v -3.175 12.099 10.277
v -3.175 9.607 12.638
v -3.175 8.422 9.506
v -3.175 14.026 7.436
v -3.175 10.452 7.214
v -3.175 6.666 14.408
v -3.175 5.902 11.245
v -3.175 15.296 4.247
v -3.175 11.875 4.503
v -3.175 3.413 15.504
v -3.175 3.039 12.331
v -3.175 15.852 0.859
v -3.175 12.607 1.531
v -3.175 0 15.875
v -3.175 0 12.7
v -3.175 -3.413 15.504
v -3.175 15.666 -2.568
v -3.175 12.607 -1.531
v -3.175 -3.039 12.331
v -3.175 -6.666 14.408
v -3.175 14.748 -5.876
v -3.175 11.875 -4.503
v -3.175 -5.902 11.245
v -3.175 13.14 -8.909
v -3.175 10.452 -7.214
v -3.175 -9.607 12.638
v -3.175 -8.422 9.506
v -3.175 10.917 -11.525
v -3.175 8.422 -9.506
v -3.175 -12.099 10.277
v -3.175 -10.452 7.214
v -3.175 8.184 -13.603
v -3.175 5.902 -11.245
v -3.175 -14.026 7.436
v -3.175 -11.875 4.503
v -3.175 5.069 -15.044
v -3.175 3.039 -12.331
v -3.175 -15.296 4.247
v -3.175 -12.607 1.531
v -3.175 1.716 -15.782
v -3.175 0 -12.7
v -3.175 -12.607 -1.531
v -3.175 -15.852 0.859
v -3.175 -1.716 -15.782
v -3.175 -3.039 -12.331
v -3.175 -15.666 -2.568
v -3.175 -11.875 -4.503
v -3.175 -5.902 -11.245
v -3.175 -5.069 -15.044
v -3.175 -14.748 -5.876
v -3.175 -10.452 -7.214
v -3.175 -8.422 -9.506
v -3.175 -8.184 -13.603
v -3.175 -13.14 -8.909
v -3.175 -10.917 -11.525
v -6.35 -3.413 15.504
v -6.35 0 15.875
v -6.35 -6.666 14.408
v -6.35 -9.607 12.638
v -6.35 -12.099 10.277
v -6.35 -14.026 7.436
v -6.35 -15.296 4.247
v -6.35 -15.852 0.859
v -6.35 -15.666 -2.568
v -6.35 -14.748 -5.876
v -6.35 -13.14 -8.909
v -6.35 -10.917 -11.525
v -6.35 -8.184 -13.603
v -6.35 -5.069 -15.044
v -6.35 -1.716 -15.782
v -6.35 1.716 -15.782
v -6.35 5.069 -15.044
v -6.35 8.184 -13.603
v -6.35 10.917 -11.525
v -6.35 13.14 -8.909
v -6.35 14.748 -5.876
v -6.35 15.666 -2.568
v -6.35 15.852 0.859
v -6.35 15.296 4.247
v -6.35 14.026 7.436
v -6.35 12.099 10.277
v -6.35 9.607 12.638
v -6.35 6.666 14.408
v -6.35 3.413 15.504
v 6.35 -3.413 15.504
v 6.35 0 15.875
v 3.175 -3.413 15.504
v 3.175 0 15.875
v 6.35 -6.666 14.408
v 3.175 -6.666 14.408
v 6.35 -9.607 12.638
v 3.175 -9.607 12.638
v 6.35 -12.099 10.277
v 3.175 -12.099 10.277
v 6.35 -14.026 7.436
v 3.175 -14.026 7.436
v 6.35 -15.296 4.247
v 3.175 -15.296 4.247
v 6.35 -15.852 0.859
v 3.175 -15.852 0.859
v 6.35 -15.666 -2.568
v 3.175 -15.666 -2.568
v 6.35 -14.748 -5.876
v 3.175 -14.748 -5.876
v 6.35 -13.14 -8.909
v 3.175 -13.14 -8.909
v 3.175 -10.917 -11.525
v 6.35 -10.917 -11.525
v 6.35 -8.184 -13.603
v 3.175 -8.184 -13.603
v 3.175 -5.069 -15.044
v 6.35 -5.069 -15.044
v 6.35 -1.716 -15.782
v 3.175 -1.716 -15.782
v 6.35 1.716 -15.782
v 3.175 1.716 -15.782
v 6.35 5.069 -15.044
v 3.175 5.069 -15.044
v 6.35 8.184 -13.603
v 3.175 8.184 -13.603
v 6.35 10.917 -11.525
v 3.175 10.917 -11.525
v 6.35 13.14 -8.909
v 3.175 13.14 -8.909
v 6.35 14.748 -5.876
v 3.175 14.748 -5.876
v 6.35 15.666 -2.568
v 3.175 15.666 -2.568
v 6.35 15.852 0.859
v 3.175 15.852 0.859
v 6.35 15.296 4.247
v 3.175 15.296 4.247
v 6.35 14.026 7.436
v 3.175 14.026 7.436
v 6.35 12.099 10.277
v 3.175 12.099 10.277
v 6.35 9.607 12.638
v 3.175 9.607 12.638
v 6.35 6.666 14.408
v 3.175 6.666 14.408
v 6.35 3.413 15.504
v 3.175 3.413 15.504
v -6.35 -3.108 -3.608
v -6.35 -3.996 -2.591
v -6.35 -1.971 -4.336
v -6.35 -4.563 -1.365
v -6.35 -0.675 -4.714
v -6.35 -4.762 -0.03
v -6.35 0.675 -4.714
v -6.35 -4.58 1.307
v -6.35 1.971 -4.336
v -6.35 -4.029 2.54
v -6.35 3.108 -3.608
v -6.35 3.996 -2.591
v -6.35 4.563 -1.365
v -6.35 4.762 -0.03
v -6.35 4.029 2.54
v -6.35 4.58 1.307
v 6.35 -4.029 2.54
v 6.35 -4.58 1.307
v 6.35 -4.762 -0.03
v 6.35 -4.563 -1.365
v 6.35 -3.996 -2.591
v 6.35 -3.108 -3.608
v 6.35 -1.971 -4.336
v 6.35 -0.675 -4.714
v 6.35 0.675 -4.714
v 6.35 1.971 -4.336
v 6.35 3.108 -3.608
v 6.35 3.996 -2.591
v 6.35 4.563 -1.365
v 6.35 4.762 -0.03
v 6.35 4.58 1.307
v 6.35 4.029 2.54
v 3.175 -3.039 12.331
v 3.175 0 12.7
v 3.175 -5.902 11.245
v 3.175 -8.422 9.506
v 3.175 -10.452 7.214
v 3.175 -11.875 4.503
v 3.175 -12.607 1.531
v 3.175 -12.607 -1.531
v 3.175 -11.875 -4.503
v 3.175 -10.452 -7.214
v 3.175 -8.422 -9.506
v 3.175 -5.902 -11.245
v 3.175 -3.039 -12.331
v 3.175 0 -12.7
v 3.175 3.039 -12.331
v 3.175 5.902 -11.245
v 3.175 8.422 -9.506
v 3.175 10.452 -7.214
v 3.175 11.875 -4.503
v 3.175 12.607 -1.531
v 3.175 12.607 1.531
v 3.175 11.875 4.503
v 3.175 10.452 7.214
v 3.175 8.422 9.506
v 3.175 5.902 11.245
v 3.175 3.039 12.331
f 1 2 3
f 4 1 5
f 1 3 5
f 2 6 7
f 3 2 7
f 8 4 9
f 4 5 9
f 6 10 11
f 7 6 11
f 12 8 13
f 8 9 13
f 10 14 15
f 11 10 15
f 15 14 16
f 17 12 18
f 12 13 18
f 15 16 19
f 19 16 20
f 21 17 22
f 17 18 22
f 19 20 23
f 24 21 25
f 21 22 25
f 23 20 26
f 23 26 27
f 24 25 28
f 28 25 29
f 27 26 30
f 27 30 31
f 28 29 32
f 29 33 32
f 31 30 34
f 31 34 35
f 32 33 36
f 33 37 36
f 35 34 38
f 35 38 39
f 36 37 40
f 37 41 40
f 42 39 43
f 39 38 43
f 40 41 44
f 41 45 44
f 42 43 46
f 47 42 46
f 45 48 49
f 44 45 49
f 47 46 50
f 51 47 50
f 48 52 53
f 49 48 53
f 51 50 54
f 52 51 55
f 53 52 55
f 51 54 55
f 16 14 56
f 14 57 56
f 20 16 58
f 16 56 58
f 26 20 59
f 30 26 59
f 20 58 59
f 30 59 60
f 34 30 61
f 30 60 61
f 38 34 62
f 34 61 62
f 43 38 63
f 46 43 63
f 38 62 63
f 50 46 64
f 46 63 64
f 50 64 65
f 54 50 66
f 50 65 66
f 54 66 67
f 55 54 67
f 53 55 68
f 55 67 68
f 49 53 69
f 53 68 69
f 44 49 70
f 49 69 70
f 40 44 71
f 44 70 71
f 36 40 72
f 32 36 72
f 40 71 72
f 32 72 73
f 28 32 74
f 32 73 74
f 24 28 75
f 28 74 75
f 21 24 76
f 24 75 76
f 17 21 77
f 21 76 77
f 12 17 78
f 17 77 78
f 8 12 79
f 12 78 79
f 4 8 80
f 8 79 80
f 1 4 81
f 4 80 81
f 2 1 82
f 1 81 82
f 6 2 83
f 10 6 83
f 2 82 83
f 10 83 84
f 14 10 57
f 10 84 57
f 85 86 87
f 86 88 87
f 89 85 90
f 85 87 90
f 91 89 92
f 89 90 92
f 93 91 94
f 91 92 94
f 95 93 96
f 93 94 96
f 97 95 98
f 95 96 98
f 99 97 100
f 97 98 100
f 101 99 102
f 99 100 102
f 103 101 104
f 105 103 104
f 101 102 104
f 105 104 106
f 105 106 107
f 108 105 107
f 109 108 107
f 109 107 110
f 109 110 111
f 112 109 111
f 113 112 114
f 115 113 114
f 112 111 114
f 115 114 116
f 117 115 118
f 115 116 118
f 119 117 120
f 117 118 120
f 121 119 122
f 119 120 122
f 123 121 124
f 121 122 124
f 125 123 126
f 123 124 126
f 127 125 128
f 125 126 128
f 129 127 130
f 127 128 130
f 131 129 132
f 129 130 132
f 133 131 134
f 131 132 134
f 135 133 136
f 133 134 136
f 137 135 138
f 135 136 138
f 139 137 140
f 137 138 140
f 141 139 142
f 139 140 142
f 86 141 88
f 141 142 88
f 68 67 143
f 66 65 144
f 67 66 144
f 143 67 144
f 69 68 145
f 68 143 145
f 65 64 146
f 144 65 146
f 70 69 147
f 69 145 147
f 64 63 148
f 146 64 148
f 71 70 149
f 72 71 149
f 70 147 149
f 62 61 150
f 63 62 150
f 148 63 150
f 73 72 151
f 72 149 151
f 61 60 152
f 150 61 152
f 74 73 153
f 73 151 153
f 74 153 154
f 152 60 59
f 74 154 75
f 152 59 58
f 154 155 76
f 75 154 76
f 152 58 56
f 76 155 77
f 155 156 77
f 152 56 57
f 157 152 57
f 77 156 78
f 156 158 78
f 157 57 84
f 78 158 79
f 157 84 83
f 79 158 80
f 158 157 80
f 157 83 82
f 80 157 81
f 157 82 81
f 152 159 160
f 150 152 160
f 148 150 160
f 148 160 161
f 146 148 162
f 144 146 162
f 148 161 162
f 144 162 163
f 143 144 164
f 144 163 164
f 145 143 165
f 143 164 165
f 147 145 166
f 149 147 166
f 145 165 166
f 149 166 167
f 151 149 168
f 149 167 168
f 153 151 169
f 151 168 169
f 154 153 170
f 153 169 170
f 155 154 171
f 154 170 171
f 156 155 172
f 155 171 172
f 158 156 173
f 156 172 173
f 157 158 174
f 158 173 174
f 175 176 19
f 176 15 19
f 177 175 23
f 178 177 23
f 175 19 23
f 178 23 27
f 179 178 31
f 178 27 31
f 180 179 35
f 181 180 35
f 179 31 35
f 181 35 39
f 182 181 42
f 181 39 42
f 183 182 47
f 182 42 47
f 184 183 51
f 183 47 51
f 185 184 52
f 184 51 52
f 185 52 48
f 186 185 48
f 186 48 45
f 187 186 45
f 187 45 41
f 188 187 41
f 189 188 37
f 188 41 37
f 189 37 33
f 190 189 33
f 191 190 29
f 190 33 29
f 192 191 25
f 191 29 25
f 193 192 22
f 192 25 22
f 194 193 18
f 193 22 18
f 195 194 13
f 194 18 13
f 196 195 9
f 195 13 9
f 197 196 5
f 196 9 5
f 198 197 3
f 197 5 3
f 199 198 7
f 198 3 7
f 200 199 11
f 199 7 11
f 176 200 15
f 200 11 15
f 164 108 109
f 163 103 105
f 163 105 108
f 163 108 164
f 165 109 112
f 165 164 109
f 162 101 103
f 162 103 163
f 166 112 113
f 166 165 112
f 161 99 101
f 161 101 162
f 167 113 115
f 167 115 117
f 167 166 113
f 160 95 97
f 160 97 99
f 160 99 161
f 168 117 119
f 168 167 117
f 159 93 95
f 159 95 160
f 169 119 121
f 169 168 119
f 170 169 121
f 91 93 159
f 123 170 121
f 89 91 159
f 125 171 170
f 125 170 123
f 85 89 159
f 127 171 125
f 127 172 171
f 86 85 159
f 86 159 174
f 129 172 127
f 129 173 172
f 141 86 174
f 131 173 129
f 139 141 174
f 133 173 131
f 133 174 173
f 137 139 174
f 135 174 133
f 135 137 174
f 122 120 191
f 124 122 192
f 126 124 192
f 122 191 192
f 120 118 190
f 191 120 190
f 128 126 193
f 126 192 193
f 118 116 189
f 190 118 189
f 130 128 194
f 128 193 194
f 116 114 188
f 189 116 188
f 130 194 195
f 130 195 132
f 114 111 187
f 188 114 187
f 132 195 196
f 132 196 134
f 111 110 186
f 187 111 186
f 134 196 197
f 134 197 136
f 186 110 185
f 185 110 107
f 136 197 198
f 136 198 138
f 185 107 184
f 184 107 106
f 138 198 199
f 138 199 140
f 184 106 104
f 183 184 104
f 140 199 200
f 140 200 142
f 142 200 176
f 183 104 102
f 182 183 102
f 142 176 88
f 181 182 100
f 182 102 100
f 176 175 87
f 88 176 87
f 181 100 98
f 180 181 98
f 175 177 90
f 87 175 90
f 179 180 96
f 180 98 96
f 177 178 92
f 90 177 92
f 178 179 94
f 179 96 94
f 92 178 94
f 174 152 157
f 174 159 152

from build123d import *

# Parameters (mm, degrees)
F3_DEPTH      = 6.35
F3_DEPTH_BACK = 6.35


with BuildPart() as f1:
    # F0 (on Front) → F1 (revolve)
    with BuildSketch(Plane.XZ):
        Polygon((-6.35, 15.875), (-6.35, 4.7625), (6.35, 4.7625), (6.35, 15.875), (3.175, 15.875), (3.175, 12.7), (-3.175, 12.7), (-3.175, 15.875), align=None)
    revolve(axis=Axis((0, 0, 0), (1, 0, 0)))

    # F2 (on Right) → F3 (join, two sides)
    with BuildSketch(Plane.YZ) as f3_sk:
        with BuildLine():
            Line((-4.0286233691, 2.54), (4.0286233691, 2.54))
            ThreePointArc((4.0286233691, 2.54), (0, 4.7625), (-4.0286233691, 2.54))
        make_face()
    extrude(amount=F3_DEPTH)
    extrude(f3_sk.sketch, amount=-F3_DEPTH_BACK)


solid = f1.part
